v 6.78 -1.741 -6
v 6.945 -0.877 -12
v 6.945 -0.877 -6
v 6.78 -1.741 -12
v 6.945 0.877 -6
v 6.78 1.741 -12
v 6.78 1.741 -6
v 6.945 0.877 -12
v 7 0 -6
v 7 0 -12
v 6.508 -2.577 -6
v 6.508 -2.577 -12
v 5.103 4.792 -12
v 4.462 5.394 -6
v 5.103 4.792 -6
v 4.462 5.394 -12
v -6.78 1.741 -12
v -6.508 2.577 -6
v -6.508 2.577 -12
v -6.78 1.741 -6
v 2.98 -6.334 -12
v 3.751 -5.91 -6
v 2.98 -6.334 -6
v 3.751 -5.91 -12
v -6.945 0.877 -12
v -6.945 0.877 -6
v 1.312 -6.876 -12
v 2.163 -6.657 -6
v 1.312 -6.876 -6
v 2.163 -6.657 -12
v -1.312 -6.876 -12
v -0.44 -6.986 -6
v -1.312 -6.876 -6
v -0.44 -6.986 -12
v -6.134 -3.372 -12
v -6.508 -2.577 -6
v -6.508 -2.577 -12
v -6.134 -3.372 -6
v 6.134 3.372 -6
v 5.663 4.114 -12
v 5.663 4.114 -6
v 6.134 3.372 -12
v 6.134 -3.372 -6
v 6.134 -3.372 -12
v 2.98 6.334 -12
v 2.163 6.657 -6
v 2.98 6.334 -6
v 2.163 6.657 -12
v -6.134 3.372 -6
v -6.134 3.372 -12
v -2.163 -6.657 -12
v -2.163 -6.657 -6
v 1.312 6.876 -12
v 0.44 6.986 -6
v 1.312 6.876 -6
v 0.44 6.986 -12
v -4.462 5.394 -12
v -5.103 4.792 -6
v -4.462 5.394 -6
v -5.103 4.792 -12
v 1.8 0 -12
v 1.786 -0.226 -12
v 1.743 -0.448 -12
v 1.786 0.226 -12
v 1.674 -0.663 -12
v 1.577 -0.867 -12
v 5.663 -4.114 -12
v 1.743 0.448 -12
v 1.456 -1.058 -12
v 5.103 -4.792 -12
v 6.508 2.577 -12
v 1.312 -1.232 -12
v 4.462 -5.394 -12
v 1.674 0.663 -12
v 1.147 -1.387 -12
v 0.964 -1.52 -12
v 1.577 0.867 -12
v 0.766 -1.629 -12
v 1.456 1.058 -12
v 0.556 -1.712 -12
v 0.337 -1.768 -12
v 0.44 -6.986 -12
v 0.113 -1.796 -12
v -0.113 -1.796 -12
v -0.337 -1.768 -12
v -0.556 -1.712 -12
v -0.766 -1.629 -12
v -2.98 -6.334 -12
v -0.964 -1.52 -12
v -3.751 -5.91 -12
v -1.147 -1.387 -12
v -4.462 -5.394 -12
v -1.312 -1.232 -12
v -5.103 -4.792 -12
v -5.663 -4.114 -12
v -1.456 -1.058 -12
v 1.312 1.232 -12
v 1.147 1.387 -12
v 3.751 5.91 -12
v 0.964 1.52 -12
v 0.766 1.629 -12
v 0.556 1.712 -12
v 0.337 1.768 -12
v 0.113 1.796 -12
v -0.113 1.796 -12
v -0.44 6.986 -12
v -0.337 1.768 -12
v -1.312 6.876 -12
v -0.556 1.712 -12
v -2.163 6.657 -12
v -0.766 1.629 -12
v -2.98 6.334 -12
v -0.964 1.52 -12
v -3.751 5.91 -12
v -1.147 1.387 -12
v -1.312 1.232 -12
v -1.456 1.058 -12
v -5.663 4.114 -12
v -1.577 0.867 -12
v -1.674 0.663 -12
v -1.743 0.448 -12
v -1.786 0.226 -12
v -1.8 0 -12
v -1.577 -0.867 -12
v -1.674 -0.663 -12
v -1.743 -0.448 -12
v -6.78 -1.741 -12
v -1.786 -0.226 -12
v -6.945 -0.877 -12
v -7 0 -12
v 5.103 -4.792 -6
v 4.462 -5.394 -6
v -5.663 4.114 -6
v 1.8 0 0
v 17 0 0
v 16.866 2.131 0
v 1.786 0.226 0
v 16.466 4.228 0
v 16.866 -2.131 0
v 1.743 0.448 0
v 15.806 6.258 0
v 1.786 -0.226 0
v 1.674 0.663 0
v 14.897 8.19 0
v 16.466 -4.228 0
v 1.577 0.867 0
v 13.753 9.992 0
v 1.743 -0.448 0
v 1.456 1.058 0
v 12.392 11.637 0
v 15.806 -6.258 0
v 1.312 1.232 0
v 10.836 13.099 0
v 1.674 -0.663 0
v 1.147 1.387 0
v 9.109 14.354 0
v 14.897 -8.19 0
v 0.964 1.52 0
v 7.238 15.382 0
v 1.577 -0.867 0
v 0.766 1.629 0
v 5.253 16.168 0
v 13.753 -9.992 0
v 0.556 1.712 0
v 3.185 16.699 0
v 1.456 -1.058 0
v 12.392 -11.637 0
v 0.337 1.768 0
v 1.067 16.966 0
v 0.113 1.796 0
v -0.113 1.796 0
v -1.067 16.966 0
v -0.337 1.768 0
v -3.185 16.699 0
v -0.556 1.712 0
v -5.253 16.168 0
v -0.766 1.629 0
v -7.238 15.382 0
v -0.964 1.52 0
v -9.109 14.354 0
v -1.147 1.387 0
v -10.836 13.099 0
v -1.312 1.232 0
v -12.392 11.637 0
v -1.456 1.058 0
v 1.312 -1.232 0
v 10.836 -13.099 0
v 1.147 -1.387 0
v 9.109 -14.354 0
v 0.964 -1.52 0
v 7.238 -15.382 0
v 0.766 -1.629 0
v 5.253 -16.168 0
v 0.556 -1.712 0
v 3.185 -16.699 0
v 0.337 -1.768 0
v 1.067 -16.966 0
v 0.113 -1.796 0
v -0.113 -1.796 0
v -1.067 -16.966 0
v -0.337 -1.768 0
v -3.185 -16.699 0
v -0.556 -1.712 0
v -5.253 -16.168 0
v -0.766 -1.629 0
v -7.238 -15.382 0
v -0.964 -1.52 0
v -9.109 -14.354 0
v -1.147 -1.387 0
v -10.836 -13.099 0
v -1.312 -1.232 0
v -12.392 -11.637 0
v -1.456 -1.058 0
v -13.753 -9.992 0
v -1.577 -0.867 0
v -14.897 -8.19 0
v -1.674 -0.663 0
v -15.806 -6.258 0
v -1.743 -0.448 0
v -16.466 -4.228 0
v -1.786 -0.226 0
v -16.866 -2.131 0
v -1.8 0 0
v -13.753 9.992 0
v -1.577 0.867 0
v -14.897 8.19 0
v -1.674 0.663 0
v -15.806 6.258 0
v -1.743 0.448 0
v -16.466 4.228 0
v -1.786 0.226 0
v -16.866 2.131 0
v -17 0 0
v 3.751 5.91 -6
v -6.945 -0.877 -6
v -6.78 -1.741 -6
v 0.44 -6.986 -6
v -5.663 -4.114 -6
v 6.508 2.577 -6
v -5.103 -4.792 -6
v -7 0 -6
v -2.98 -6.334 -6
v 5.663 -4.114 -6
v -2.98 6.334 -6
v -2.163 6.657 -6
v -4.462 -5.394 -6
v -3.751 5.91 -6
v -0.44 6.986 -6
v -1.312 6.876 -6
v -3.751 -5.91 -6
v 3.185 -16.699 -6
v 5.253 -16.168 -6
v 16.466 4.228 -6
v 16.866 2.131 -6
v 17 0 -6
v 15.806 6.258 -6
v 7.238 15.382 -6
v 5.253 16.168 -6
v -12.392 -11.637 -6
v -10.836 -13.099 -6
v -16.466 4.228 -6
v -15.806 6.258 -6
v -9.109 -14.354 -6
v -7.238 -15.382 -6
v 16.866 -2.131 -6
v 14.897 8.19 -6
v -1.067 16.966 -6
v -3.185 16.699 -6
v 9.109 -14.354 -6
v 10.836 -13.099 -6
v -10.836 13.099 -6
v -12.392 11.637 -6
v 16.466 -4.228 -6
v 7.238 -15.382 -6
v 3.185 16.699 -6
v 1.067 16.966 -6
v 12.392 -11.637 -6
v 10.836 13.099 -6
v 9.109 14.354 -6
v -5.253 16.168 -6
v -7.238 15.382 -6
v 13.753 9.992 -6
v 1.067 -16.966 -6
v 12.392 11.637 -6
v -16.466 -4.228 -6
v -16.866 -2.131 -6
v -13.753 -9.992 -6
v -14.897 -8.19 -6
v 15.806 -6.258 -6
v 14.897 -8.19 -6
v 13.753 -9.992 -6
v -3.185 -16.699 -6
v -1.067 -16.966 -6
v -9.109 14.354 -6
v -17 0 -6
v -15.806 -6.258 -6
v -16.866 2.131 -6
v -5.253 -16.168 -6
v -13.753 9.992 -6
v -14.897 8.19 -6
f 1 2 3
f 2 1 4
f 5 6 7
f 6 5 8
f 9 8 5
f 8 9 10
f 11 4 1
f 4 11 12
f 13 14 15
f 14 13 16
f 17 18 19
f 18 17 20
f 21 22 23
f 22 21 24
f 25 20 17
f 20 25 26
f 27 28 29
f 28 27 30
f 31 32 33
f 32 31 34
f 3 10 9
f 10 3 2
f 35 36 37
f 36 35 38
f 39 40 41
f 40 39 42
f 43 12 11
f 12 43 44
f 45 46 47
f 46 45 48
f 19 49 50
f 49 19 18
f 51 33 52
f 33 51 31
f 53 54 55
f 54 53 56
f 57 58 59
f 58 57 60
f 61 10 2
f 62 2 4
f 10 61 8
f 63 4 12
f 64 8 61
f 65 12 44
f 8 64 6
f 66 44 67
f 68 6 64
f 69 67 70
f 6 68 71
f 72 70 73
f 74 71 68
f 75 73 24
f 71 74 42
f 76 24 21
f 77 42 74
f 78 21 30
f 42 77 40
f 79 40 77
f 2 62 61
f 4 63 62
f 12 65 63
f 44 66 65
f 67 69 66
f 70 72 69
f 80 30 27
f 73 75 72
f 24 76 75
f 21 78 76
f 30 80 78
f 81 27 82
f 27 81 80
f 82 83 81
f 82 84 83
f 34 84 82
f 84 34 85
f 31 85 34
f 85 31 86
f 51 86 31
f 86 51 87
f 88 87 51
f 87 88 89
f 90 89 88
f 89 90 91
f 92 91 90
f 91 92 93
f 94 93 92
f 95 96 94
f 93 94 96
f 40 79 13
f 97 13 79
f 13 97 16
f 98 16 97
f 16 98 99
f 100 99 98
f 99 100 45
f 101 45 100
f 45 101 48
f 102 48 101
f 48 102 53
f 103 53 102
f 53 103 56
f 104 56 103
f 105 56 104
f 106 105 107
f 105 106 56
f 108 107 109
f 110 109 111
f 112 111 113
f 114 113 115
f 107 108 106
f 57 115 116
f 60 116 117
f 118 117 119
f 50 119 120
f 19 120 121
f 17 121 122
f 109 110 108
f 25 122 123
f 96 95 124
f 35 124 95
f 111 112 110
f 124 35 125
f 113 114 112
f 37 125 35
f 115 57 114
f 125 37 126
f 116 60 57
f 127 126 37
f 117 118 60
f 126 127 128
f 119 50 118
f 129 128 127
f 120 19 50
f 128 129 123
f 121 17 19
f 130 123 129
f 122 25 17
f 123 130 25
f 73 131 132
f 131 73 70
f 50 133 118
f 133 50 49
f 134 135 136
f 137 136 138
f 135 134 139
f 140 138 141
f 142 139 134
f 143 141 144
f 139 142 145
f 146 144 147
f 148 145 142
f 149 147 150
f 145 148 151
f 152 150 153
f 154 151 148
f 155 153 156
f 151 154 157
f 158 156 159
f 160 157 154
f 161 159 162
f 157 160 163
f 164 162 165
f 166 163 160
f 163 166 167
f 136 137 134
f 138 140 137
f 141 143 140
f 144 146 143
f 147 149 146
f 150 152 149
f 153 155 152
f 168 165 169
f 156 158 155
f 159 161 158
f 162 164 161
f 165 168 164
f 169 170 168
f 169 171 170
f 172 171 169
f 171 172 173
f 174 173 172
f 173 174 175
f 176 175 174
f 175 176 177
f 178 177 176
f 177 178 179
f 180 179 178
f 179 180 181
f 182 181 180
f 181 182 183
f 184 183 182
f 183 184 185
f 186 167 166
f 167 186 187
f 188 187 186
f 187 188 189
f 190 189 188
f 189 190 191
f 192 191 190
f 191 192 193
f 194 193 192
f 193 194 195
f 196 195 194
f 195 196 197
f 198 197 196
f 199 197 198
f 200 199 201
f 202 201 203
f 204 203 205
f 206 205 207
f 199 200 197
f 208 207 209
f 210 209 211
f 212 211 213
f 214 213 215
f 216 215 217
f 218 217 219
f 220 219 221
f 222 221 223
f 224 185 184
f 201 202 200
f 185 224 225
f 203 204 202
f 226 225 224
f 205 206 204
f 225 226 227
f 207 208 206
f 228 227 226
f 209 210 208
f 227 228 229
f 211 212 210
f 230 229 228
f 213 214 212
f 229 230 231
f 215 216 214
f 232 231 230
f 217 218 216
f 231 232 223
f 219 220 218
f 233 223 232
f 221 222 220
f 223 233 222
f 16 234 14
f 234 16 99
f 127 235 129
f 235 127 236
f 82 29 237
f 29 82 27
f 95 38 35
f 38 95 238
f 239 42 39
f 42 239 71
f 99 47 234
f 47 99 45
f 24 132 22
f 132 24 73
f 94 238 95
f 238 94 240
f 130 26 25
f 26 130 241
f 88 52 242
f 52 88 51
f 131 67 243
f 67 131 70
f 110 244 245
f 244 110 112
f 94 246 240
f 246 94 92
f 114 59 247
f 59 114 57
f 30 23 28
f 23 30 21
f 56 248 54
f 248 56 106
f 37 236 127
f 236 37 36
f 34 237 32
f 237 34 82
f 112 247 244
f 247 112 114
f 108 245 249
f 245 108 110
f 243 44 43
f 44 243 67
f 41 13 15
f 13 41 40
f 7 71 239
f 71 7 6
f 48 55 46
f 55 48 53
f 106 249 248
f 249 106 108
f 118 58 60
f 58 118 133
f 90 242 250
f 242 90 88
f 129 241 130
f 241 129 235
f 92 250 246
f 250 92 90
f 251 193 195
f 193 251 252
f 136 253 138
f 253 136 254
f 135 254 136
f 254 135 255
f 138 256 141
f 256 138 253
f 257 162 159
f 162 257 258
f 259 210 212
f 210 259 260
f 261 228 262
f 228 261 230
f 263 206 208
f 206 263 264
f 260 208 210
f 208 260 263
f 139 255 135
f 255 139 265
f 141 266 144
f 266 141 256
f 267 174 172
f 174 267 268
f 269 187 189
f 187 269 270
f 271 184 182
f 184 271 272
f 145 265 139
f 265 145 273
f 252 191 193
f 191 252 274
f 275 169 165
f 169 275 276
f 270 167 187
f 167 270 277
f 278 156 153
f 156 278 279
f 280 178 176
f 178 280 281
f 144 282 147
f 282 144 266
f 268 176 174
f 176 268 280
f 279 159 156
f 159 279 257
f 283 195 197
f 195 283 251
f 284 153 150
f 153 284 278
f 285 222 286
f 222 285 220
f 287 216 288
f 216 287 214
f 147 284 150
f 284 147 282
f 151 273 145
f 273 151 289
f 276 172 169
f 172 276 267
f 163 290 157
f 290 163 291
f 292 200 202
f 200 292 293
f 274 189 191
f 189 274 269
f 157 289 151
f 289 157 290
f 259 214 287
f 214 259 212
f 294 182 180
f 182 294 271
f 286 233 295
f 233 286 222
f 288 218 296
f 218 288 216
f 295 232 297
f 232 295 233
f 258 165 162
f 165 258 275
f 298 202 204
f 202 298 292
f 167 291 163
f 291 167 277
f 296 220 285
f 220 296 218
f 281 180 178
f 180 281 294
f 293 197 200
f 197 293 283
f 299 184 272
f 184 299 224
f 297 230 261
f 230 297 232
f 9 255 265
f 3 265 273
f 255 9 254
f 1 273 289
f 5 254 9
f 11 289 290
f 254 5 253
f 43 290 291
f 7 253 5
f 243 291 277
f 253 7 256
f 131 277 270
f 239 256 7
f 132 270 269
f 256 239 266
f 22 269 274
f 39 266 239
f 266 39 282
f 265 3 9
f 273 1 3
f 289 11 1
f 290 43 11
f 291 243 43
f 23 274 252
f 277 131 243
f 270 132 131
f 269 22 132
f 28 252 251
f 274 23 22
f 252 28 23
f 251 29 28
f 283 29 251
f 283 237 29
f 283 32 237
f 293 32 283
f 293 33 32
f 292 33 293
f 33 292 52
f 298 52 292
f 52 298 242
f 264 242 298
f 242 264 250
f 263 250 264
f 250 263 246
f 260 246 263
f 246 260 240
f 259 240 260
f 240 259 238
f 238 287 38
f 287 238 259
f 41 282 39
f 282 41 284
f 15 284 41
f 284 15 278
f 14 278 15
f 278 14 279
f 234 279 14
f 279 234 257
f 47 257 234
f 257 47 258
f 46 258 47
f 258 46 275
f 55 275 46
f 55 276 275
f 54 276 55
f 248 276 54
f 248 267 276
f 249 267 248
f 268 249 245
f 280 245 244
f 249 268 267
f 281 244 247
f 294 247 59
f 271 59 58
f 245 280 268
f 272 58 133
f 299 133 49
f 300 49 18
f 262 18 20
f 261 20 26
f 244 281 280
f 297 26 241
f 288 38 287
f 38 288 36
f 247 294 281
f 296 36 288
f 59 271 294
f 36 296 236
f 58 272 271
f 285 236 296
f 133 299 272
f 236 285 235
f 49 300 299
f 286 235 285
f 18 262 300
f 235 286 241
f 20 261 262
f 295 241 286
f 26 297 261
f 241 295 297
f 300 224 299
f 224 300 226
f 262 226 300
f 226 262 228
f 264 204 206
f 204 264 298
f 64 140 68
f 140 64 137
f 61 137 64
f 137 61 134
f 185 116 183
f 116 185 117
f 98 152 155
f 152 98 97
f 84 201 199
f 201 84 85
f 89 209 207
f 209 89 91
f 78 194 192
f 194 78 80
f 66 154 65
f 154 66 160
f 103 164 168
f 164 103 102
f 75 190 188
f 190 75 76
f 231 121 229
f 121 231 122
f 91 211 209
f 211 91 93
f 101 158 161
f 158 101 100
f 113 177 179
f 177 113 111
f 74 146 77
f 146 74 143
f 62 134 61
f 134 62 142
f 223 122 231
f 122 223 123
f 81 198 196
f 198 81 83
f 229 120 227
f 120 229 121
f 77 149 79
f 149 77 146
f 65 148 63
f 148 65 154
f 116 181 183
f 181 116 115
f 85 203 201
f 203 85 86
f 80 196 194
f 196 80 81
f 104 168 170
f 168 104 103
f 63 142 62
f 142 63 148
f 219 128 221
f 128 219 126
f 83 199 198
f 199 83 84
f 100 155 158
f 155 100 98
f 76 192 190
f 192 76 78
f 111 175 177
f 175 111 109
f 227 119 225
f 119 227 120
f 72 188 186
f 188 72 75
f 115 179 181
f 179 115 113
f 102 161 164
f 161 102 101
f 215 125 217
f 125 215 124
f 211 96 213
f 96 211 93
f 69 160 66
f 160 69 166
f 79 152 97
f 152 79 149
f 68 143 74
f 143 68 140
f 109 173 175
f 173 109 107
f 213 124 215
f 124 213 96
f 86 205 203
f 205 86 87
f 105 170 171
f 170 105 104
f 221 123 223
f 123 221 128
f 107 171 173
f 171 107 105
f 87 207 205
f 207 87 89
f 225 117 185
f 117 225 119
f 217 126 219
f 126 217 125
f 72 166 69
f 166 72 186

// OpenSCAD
$fn = 50;


difference() {
	union() {
		translate(v = [0, 0, -12.0000000000]) {
			cylinder(h = 12, r = 7.0000000000);
		}
		translate(v = [0, 0, -6.0000000000]) {
			cylinder(h = 6, r = 17.0000000000);
		}
	}
	union() {
		#translate(v = [0, 0, -12]) {
			cylinder(h = 12, r = 1.8000000000);
		}
	}
}
